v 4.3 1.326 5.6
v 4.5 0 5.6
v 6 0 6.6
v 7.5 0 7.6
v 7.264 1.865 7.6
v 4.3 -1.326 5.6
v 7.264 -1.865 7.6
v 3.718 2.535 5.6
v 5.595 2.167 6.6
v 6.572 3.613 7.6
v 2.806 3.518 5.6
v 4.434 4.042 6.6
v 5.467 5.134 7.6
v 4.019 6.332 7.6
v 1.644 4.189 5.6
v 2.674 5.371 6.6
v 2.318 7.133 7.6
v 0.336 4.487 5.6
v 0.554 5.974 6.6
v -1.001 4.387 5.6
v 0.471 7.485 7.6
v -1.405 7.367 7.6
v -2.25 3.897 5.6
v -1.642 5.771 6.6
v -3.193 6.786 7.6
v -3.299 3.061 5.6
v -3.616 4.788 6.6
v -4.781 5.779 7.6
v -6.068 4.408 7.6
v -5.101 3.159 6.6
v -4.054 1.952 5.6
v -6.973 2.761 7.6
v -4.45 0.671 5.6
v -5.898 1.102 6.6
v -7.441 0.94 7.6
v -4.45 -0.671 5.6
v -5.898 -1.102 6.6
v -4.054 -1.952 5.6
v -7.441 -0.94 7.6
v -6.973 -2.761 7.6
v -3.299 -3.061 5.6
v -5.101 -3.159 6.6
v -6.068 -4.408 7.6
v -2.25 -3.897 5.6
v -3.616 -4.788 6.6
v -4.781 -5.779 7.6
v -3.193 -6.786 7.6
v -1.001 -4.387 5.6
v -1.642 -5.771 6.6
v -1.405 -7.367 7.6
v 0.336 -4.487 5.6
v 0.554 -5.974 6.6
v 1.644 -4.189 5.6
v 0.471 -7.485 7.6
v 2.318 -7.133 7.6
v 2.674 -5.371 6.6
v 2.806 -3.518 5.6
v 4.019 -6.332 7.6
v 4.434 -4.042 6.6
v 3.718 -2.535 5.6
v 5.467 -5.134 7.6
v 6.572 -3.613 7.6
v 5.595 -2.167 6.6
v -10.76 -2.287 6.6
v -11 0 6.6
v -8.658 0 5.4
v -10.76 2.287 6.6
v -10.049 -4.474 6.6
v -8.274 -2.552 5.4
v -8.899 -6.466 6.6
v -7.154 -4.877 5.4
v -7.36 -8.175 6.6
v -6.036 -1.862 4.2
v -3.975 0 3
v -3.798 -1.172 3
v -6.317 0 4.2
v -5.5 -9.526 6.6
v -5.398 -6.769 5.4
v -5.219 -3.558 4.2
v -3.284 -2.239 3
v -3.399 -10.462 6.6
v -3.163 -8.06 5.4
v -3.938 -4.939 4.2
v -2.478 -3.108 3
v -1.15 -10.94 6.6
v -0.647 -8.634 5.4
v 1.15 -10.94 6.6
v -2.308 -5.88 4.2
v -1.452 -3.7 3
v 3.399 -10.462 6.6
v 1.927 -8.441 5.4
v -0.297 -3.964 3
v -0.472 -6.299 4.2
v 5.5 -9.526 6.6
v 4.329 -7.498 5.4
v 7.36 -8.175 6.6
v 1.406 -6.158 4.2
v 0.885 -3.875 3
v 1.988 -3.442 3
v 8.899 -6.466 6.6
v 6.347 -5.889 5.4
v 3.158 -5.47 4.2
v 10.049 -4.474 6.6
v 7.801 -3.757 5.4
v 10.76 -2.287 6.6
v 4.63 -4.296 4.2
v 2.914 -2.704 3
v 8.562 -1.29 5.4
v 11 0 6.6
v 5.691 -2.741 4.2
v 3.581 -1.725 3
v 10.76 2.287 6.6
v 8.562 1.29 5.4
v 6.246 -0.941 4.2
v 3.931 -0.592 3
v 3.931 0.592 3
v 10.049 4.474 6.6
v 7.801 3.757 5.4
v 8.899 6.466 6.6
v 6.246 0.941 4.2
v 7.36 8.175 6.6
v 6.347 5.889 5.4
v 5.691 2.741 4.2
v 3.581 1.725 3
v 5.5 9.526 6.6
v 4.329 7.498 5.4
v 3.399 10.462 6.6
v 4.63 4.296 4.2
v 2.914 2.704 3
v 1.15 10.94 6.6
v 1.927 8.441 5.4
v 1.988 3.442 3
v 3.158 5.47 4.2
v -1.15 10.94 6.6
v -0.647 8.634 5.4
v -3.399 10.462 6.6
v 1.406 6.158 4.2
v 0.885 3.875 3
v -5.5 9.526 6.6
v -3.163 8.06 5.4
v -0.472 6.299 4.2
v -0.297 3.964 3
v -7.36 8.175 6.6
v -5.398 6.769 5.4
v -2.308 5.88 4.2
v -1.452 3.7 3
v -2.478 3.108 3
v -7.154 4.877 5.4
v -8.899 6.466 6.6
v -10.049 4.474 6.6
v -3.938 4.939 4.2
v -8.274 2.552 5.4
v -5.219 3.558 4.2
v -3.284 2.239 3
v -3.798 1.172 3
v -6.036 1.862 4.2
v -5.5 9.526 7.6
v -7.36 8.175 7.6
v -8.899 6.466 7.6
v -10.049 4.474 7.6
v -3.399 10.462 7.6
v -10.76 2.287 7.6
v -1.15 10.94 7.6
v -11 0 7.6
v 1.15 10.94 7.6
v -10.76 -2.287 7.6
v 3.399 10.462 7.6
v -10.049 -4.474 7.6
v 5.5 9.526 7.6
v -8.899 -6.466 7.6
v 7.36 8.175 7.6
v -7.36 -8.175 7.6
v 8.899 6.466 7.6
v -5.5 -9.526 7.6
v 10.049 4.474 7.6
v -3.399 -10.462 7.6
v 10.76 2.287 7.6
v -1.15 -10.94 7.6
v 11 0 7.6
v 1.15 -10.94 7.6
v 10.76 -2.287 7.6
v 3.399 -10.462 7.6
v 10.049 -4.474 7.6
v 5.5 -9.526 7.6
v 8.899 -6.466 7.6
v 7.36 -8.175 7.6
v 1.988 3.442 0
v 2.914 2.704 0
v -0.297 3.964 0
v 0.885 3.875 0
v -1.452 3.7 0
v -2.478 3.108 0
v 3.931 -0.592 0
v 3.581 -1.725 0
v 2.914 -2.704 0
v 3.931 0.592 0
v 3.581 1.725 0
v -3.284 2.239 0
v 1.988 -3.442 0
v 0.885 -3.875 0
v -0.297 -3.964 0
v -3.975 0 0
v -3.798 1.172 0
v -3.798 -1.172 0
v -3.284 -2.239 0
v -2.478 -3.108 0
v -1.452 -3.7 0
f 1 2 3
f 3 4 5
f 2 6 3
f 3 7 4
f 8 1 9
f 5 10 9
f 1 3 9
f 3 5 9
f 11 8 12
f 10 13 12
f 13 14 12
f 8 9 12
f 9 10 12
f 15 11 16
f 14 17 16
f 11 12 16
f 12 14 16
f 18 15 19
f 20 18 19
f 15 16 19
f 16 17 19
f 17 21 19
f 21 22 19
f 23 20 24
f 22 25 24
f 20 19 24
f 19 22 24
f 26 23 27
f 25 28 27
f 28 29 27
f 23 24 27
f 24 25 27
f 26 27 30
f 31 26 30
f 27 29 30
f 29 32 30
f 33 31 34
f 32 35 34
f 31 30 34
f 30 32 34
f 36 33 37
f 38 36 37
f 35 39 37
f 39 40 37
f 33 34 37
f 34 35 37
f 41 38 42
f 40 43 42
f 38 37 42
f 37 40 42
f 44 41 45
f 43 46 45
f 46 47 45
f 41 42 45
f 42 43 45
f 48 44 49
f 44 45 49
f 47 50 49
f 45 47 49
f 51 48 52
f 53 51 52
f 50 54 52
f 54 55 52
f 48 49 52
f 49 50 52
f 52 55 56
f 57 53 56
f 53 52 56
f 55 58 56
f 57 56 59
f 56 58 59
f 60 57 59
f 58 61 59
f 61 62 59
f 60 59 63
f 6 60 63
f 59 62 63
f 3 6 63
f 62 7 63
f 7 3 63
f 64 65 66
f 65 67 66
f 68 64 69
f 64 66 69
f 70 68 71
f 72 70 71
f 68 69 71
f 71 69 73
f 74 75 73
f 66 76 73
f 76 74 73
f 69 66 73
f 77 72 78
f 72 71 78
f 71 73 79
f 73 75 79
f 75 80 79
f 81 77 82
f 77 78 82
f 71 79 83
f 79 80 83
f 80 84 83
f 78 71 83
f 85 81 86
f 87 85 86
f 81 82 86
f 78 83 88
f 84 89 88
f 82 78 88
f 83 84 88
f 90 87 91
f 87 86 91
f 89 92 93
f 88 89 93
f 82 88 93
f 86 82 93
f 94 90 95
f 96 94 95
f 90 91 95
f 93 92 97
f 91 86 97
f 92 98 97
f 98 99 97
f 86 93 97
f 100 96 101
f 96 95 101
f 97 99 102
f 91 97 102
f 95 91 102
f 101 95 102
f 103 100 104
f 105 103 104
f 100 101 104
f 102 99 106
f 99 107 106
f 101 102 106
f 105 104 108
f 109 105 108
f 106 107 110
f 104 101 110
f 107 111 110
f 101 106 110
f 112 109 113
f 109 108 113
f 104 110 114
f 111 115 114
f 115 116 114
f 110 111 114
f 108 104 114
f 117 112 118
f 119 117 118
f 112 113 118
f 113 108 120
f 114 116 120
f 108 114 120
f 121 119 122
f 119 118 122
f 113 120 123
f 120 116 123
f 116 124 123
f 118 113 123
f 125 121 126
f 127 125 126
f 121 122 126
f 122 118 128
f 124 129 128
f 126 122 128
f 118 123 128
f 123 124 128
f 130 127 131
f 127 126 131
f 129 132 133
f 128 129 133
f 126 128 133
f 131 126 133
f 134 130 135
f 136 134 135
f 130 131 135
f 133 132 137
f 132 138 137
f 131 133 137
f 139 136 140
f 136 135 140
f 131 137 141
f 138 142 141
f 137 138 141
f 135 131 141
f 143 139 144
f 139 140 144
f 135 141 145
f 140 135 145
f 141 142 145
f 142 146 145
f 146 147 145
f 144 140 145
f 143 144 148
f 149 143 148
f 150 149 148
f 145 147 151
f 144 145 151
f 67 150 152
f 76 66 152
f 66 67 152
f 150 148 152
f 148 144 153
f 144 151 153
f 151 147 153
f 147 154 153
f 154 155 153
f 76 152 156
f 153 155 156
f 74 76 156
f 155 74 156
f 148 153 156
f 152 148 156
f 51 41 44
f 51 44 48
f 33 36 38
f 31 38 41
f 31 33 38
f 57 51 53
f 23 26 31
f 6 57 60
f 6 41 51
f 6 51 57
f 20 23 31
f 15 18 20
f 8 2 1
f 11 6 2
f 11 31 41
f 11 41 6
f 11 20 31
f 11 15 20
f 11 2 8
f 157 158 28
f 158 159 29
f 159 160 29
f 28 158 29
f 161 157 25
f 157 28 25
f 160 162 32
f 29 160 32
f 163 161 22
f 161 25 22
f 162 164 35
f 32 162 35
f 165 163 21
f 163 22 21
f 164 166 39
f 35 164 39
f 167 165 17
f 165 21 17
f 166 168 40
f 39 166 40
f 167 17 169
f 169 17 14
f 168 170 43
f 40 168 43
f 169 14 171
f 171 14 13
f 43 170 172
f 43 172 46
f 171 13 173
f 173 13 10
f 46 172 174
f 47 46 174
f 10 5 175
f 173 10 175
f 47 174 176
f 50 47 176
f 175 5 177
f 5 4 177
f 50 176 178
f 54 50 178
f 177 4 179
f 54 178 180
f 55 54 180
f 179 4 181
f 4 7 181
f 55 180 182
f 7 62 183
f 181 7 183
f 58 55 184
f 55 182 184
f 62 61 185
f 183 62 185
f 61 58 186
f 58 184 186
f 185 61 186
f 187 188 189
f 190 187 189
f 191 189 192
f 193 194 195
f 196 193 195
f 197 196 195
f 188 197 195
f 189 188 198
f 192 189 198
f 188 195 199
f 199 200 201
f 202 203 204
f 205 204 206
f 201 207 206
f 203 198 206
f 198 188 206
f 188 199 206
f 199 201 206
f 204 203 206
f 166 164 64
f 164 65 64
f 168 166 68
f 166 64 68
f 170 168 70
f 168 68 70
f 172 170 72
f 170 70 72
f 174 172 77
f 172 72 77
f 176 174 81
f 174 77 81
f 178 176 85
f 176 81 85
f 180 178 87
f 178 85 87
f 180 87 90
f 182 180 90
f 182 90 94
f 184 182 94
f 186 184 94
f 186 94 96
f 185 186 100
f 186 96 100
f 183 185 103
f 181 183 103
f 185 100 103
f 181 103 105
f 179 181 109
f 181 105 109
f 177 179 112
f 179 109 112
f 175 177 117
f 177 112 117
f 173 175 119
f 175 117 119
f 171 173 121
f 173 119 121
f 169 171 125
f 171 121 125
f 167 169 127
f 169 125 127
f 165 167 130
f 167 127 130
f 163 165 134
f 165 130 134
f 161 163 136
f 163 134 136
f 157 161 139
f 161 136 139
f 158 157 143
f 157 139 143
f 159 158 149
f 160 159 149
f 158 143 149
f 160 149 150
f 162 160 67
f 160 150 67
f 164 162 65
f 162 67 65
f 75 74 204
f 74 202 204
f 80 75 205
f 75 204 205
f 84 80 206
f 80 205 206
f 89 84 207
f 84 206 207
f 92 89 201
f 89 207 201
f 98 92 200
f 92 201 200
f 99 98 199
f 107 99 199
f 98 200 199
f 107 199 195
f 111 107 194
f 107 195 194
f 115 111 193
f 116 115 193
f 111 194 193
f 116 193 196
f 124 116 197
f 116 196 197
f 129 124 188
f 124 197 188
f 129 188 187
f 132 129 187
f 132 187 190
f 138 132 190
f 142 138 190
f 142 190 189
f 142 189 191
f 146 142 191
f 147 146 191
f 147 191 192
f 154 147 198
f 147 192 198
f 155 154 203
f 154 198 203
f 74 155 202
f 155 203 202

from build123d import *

# Parameters (mm, degrees)
F2_R     = 7.5
F3_DEPTH = 2
F4_SIZE2 = 1.99999
F4_SIZE  = 2.99999


# Not quite as in the source:
# - a fillet or chamfer is up to 0.001 mm smaller than in the source, because OpenCascade refuses the exact size


with BuildPart() as f1:
    # F0 (on Front) → F1 (revolve)
    with BuildSketch(Plane.XZ):
        Polygon((-3.975, 0), (0, 0), (0, 7.6), (-11, 7.6), (-11, 6.6), (-3.975, 3), align=None)
    revolve(axis=Axis((0, 0, 3.8), (0, 0, 1)))

    # F2 (on face) → F3 (cut)
    with BuildSketch(Plane.XY.offset(7.6)):
        Circle(F2_R)
    extrude(amount=-F3_DEPTH, mode=Mode.SUBTRACT)

    # F4 (size 3 and 2 in the source; OpenCascade refuses exactly that, so slightly less here)
    f4_edges = [f1.edges().sort_by_distance(p)[0] for p in [
        (-7.5, 0, 5.6),
    ]]
    f4_side = f1.faces().sort_by_distance((0, 0, 5.6))[0]
    chamfer(f4_edges, length=F4_SIZE, length2=F4_SIZE2, reference=f4_side)


solid = f1.part
